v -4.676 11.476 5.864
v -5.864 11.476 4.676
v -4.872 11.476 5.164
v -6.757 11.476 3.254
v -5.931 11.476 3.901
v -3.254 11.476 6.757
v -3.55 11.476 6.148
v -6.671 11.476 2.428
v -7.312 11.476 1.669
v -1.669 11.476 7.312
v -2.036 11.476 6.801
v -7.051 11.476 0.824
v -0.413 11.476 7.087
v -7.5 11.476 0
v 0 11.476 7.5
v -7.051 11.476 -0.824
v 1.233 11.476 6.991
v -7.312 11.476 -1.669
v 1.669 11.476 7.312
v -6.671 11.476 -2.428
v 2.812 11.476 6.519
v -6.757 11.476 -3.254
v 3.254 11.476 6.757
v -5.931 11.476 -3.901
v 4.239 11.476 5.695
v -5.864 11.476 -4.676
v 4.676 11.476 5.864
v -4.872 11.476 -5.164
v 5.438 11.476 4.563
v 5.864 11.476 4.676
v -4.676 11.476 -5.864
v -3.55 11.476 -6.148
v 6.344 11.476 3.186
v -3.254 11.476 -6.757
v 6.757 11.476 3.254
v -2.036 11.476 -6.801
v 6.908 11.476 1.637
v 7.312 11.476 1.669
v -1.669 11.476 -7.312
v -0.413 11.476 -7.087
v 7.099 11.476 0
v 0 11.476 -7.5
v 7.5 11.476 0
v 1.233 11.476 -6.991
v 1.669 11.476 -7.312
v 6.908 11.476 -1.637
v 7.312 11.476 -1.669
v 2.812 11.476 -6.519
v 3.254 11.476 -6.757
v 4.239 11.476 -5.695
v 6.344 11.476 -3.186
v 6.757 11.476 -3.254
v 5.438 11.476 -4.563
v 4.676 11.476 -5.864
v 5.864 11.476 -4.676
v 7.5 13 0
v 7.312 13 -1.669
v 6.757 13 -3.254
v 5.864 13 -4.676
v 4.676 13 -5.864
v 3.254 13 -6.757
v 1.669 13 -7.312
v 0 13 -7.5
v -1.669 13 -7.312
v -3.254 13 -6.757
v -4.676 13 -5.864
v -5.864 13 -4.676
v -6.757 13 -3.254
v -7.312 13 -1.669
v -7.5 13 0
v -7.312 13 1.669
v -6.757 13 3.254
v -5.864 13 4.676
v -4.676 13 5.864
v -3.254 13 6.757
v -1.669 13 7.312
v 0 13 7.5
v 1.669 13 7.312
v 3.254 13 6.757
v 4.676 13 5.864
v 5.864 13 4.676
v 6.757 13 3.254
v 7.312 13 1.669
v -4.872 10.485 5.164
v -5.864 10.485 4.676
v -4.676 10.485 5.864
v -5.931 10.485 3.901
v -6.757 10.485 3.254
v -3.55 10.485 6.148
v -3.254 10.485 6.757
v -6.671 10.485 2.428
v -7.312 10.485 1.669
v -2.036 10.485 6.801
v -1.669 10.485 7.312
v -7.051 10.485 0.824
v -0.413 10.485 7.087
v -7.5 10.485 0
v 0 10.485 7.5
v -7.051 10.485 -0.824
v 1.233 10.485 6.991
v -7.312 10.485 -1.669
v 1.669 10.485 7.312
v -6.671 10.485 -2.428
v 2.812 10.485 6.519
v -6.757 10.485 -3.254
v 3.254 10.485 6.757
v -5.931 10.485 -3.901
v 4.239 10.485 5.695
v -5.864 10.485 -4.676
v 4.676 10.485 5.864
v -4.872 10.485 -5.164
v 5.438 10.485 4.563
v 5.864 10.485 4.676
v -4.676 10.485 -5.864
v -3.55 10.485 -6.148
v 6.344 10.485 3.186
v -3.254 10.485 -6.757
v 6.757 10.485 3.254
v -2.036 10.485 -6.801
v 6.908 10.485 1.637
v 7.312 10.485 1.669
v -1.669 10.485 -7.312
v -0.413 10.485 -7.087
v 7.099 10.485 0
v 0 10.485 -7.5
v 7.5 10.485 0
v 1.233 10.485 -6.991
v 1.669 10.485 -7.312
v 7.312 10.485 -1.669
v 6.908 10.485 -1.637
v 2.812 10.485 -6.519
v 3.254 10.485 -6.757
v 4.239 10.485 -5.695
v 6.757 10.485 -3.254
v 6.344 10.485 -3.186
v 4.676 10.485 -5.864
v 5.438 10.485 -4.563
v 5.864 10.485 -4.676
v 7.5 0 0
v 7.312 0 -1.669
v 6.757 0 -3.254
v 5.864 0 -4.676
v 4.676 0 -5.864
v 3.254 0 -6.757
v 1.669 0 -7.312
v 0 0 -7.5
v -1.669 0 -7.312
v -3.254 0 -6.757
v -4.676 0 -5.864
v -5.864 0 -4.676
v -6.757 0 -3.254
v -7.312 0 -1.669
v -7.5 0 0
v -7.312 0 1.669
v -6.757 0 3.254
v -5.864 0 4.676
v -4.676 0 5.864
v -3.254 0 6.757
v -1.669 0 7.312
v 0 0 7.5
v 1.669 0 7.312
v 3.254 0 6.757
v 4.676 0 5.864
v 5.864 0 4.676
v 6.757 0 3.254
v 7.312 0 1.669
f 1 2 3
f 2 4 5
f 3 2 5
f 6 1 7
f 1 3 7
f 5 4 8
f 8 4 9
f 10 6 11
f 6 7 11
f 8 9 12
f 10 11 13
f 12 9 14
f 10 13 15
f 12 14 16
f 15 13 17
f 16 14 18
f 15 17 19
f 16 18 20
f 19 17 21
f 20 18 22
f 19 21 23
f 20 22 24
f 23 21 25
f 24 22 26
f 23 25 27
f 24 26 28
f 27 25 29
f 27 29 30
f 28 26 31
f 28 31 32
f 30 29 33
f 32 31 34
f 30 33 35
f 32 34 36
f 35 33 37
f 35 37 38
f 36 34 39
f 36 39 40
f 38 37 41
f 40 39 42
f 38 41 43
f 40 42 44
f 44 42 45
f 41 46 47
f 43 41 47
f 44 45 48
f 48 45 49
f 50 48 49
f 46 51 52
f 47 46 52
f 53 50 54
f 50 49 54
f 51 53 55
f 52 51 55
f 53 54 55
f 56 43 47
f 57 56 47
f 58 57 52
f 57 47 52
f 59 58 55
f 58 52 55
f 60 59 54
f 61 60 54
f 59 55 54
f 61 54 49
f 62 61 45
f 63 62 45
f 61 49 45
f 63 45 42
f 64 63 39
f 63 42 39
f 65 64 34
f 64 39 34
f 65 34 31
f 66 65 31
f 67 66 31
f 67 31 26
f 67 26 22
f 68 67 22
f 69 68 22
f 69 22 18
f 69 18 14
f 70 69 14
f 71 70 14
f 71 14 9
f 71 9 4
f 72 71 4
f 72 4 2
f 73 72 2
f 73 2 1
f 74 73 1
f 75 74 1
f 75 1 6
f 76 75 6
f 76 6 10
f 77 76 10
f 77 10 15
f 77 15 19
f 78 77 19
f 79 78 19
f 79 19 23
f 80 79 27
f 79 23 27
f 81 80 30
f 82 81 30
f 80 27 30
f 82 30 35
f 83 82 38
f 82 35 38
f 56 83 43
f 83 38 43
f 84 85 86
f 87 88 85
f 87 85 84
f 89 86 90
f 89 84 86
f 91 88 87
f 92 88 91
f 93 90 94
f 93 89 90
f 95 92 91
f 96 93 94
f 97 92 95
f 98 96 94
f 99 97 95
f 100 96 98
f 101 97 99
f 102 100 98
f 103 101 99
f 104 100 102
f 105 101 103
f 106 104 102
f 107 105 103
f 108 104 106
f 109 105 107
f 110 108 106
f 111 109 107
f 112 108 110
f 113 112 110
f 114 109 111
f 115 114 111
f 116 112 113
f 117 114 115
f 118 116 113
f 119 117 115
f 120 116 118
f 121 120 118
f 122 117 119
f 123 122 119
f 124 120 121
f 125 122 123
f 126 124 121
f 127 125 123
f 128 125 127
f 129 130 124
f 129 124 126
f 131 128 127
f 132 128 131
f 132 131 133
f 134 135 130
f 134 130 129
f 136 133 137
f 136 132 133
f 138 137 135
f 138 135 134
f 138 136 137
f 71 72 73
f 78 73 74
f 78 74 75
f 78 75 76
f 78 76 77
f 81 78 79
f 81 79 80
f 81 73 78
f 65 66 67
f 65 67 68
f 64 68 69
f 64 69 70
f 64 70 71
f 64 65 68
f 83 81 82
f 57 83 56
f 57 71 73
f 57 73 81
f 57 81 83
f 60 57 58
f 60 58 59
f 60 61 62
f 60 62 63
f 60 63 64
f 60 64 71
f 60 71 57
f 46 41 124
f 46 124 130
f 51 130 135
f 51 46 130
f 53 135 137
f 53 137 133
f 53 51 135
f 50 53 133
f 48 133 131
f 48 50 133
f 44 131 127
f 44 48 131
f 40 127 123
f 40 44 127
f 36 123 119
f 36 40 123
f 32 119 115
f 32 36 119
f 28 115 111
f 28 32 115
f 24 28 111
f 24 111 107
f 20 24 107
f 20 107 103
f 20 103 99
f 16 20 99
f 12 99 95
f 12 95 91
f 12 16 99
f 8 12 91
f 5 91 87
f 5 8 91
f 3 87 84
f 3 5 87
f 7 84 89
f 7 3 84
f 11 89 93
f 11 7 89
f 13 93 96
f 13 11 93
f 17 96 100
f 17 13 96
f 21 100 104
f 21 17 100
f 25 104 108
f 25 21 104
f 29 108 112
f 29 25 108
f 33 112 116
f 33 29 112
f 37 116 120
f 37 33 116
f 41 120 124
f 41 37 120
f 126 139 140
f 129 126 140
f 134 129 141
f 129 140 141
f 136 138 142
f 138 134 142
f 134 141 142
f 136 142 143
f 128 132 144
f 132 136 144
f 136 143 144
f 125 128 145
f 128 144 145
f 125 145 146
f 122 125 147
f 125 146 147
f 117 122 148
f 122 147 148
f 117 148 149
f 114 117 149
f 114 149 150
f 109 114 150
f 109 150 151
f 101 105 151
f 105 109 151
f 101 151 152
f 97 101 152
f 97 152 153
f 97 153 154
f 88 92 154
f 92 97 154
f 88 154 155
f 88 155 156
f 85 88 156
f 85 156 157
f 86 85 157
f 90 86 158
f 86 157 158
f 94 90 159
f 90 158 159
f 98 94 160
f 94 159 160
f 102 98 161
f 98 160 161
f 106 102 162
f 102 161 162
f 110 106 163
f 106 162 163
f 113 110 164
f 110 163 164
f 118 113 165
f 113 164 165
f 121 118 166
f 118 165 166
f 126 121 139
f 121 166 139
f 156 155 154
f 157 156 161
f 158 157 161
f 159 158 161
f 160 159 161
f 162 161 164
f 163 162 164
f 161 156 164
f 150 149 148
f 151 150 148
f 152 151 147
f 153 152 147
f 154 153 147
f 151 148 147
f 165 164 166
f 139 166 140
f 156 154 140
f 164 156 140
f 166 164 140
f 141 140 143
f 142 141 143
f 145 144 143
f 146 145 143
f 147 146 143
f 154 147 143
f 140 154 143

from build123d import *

# Parameters (mm, degrees)
SKETCH1_R           = 7.5
BOSS_EXTRUDE1_DEPTH = 13
SKETCH2_R           = 7.0993
CUT_EXTRUDE1_DEPTH  = 0.9906


with BuildPart() as part:
    # Sketch1 → Boss-Extrude1 (new body)
    with BuildSketch(Plane(origin=(0, 0, 0), x_dir=(1, 0, 0), z_dir=(0, 1, 0))):
        Circle(SKETCH1_R)
    extrude(amount=BOSS_EXTRUDE1_DEPTH)

    # Sketch2 → Cut-Extrude1 (cut)
    with BuildSketch(Plane(origin=(0, 11.476, 0), x_dir=(1, 0, 0), z_dir=(0, 1, 0))):
        Polygon((-10.537332024, 10.483478538), (-10.860452938, -10.950208747), (14.271173695, -10.950208747), (12.440155183, 11.524645927), align=None)
        Circle(SKETCH2_R, mode=Mode.SUBTRACT)
    extrude(amount=-CUT_EXTRUDE1_DEPTH, mode=Mode.SUBTRACT)


solid = part.part
